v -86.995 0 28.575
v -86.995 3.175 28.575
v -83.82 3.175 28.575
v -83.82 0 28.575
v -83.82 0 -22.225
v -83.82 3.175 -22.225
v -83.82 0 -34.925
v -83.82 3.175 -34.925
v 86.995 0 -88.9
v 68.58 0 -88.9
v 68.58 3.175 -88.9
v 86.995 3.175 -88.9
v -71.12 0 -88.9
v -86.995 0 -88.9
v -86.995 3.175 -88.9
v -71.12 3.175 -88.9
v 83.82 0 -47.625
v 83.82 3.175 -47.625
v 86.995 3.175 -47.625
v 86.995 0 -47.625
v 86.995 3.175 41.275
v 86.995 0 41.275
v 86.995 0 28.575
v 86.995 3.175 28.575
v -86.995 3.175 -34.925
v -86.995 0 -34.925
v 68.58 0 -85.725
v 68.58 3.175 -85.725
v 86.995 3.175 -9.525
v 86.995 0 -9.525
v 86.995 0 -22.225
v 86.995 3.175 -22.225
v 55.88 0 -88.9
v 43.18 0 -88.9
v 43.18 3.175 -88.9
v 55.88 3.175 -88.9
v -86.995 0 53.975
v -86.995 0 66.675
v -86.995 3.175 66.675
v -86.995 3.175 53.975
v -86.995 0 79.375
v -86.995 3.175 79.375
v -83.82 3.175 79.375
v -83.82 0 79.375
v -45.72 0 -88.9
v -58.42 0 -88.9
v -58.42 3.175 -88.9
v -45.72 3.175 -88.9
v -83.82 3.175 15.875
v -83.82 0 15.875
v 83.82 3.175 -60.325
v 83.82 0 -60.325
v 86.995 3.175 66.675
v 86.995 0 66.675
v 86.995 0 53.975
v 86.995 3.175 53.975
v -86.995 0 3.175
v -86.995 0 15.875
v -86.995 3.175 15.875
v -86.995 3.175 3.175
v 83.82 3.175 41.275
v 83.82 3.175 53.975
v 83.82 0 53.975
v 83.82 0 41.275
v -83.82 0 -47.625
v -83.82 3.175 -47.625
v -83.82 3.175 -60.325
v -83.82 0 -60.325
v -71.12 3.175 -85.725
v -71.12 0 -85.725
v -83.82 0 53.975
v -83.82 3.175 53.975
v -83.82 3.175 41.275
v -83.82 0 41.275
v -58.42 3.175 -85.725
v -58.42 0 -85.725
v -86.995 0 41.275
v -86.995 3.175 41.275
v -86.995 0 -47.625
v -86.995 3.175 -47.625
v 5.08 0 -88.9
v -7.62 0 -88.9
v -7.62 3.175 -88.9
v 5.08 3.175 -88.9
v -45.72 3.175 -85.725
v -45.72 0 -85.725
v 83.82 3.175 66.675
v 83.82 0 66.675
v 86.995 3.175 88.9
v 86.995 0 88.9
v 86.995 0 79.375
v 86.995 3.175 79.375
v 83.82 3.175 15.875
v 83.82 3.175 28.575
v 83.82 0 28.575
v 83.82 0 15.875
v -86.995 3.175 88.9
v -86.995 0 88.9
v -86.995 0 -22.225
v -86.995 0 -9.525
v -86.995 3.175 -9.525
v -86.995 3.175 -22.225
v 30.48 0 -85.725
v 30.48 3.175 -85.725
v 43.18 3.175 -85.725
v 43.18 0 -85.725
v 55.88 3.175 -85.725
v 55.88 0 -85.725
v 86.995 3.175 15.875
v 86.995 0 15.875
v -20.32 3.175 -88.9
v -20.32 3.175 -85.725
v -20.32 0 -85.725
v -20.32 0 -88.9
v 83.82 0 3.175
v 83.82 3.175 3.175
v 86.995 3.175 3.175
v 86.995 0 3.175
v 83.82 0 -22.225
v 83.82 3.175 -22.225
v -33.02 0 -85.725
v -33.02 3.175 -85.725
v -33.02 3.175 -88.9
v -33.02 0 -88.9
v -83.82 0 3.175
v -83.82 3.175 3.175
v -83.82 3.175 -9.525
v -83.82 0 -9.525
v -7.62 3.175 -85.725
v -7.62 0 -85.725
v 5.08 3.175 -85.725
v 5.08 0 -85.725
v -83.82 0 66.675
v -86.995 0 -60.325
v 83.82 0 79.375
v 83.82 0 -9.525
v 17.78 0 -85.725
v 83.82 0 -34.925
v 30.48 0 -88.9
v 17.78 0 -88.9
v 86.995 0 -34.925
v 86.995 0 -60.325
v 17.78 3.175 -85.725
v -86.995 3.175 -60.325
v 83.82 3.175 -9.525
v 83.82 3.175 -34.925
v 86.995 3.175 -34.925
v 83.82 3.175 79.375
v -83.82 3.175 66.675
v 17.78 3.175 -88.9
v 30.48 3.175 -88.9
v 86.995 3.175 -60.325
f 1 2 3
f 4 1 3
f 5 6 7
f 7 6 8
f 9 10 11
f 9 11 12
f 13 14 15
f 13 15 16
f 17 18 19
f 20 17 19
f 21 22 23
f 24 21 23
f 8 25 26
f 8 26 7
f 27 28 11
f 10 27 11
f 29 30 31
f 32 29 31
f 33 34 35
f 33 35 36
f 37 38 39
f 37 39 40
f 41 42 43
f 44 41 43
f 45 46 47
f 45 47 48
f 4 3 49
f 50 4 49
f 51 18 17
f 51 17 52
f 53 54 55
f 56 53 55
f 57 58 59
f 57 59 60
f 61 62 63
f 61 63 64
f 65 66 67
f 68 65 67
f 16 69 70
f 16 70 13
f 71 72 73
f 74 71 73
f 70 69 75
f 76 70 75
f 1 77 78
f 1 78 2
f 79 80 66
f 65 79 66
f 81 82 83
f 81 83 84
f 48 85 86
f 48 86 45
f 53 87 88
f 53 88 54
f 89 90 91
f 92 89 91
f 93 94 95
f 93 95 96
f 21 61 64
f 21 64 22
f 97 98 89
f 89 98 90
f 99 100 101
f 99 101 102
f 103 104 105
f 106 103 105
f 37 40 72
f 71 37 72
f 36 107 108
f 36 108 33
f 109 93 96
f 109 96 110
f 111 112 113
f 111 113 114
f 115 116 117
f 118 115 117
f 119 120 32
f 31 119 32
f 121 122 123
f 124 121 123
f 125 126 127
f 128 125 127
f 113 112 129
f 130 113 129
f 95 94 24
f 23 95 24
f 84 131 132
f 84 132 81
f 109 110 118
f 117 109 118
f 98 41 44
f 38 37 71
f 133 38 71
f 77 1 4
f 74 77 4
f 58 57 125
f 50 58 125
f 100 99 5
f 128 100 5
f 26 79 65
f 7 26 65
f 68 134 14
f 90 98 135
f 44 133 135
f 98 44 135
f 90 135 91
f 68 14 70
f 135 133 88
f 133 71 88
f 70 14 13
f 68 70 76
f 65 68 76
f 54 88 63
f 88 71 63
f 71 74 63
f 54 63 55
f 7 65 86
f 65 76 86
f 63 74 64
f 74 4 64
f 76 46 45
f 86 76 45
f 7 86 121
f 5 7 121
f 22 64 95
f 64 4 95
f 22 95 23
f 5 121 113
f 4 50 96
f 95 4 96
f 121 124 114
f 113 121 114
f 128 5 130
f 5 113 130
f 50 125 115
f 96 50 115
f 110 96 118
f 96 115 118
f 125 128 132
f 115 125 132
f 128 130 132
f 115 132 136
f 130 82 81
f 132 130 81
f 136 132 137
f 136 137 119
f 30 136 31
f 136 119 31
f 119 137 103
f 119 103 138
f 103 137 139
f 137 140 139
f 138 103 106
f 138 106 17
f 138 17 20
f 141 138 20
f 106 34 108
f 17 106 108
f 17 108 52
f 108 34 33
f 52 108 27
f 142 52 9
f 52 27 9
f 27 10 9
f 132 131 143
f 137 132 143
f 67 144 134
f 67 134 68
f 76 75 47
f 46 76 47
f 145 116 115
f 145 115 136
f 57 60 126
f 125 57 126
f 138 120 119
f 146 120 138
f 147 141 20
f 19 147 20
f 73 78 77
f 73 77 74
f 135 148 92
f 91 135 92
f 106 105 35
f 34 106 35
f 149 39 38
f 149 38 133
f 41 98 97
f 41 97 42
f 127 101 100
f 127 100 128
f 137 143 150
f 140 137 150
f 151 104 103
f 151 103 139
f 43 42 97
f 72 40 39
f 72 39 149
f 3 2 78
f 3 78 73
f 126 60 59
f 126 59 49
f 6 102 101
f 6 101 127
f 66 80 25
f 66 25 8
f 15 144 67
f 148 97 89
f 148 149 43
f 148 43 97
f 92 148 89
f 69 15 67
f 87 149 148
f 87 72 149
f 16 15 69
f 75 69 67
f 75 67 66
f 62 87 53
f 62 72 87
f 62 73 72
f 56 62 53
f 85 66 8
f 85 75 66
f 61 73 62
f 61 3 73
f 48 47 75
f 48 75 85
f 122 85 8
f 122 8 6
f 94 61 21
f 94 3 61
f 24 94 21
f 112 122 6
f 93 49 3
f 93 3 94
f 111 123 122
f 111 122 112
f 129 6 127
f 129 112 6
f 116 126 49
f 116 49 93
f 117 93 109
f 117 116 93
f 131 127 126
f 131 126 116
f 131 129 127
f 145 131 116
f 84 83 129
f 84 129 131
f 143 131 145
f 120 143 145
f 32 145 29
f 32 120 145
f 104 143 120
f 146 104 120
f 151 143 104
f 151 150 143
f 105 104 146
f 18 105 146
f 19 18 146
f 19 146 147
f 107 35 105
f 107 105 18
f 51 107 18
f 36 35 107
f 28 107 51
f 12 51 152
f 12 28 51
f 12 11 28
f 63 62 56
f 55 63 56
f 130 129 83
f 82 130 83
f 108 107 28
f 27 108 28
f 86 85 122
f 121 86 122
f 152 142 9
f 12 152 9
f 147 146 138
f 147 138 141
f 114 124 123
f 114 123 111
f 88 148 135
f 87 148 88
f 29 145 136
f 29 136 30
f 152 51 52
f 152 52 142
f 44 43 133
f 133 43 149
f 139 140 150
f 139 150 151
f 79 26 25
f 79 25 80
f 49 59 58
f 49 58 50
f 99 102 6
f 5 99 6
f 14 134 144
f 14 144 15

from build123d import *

# Parameters (mm, degrees)
SKETCH1_W           = 173.99
SKETCH1_H           = 177.8
BOSS_EXTRUDE1_DEPTH = 3.175
SKETCH3_W           = 12.7
SKETCH3_H           = 3.175
SKETCH3_W_2         = 3.175
SKETCH3_H_2         = 12.7
CUT_EXTRUDE1_DEPTH  = 3.175


with BuildPart() as part:
    # Sketch1 → Boss-Extrude1 (new body)
    with BuildSketch(Plane(origin=(0, 0, 0), x_dir=(1, 0, 0), z_dir=(0, 1, 0))):
        Rectangle(SKETCH1_W, SKETCH1_H)
    extrude(amount=BOSS_EXTRUDE1_DEPTH)

    # Sketch3 → Cut-Extrude1 (cut)
    with BuildSketch(Plane(origin=(0, 3.175, 0), x_dir=(1, 0, 0), z_dir=(0, 1, 0))):
        with Locations((-64.77, 87.3125)):
            Rectangle(SKETCH3_W, SKETCH3_H)
        with Locations((-39.37, 87.3125)):
            Rectangle(SKETCH3_W, SKETCH3_H)
        with Locations((-13.97, 87.3125)):
            Rectangle(SKETCH3_W, SKETCH3_H)
        with Locations((11.43, 87.3125)):
            Rectangle(SKETCH3_W, SKETCH3_H)
        with Locations((36.83, 87.3125)):
            Rectangle(SKETCH3_W, SKETCH3_H)
        with Locations((62.23, 87.3125)):
            Rectangle(SKETCH3_W, SKETCH3_H)
        with Locations((-85.4075, 28.575)):
            Rectangle(SKETCH3_W_2, SKETCH3_H_2)
        with Locations((-85.4075, 53.975)):
            Rectangle(SKETCH3_W_2, SKETCH3_H_2)
        with Locations((-85.4075, 3.175)):
            Rectangle(SKETCH3_W_2, SKETCH3_H_2)
        with Locations((-85.4075, -22.225)):
            Rectangle(SKETCH3_W_2, SKETCH3_H_2)
        with Locations((-85.4075, -47.625)):
            Rectangle(SKETCH3_W_2, SKETCH3_H_2)
        with Locations((-85.4075, -73.025)):
            Rectangle(SKETCH3_W_2, SKETCH3_H_2)
        with Locations((85.4075, -73.025)):
            Rectangle(SKETCH3_W_2, SKETCH3_H_2)
        with Locations((85.4075, -47.625)):
            Rectangle(SKETCH3_W_2, SKETCH3_H_2)
        with Locations((85.4075, -22.225)):
            Rectangle(SKETCH3_W_2, SKETCH3_H_2)
        with Locations((85.4075, 3.175)):
            Rectangle(SKETCH3_W_2, SKETCH3_H_2)
        with Locations((85.4075, 28.575)):
            Rectangle(SKETCH3_W_2, SKETCH3_H_2)
        with Locations((85.4075, 53.975)):
            Rectangle(SKETCH3_W_2, SKETCH3_H_2)
    extrude(amount=-CUT_EXTRUDE1_DEPTH, mode=Mode.SUBTRACT)


solid = part.part
